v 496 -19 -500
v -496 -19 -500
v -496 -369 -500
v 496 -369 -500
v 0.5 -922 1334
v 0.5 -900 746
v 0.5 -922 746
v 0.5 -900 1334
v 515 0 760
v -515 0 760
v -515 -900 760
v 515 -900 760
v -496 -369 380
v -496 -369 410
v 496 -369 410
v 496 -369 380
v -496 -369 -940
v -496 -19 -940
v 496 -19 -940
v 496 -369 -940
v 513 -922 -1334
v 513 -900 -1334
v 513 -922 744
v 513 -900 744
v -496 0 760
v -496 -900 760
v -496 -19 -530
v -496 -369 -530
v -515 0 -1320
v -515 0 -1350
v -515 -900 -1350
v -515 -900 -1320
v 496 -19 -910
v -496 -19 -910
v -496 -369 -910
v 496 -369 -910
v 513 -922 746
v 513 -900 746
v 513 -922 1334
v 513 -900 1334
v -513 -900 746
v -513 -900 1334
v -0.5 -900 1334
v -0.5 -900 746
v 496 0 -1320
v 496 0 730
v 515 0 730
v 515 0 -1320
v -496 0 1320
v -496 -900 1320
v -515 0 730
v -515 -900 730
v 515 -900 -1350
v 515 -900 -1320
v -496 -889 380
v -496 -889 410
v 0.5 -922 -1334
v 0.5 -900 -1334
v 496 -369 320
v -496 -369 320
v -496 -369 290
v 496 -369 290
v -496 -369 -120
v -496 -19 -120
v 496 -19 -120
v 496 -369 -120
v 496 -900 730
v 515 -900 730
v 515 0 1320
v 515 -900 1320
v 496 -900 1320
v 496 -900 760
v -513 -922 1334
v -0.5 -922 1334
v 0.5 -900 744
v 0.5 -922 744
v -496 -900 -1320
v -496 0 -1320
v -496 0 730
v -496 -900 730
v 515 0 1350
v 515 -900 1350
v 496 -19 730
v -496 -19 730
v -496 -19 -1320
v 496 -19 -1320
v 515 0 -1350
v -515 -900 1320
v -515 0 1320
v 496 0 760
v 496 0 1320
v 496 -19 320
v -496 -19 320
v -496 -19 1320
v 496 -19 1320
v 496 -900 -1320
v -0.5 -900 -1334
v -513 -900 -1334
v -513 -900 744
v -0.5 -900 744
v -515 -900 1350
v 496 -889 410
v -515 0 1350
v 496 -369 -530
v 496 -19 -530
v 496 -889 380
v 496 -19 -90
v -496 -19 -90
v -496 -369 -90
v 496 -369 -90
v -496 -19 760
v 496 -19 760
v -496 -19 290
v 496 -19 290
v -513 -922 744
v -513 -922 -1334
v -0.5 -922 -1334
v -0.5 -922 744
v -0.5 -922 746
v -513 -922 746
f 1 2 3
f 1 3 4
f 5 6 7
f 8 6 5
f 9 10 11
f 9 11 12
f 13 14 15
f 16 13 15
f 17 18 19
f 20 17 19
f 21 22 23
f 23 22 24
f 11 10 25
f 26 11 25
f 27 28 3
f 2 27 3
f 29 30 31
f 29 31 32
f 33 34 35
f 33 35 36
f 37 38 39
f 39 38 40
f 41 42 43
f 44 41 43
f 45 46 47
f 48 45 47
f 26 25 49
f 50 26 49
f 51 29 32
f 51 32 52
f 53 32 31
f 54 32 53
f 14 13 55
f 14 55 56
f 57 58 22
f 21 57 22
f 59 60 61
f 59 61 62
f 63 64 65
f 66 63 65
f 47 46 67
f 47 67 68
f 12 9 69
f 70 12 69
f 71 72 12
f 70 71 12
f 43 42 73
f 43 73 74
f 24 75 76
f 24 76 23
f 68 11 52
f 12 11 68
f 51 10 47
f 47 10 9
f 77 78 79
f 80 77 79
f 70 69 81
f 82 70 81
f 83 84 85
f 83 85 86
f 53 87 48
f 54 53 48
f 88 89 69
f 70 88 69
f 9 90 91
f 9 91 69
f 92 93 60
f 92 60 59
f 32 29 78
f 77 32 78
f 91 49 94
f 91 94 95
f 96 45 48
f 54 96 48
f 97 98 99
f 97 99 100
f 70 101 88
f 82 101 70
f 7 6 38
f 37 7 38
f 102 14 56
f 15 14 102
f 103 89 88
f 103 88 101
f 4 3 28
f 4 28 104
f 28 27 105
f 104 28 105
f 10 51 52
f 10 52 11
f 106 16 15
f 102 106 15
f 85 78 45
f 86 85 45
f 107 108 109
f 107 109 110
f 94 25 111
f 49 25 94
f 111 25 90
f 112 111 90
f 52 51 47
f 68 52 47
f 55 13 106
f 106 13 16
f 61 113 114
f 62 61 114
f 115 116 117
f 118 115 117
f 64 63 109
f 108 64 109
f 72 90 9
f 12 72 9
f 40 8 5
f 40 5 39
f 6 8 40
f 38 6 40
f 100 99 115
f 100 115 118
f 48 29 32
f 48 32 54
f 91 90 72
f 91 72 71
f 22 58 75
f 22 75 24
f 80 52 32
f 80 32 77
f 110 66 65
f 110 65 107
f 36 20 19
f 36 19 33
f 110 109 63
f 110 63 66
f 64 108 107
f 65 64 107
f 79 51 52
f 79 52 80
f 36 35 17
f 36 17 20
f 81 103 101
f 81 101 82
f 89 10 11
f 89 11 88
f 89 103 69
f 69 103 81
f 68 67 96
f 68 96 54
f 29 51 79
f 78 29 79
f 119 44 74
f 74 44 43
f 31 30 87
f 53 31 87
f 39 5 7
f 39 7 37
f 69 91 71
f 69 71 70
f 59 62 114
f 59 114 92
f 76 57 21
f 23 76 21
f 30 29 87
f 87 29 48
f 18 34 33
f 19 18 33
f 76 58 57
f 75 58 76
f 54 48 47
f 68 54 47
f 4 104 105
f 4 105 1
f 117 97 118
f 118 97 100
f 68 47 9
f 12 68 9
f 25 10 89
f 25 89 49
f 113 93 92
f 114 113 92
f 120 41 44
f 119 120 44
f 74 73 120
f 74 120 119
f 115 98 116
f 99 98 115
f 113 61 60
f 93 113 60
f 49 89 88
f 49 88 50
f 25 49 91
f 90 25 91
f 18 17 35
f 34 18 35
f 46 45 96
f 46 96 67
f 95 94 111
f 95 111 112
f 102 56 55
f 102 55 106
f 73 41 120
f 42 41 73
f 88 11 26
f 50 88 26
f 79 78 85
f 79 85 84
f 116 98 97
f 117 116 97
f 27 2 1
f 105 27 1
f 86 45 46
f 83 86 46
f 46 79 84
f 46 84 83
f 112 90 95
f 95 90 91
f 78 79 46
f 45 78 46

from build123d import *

# Parameters (mm, degrees)
F1_W      = 1030
F1_H      = 30
F2_DEPTH  = 900
F3_W      = 19
F3_H      = 560
F3_H_2    = 2050
F4_DEPTH  = 900
F5_W      = 992
F5_H      = 560
F5_H_2    = 2050
F6_DEPTH  = 19
F7_W      = 992
F7_H      = 30
F8_DEPTH  = 350
F9_W      = 992
F9_H      = 30
F10_DEPTH = 520
F11_W     = 512.5
F11_H     = 2078
F11_H_2   = 588
F12_DEPTH = 22


with BuildPart() as f2:
    # F1 (on Front) → F2 (new body)
    with BuildSketch(Plane.XZ):
        with Locations((0, -1335)):
            Rectangle(F1_W, F1_H)
        with Locations((0, 745)):
            Rectangle(F1_W, F1_H)
        with Locations((0, 1335)):
            Rectangle(F1_W, F1_H)
    extrude(amount=F2_DEPTH)


with BuildPart() as f4:
    # F3 (on Front) → F4 (new body, through all)
    with BuildSketch(Plane.XZ):
        with Locations((-505.5, 1040)):
            Rectangle(F3_W, F3_H)
        with Locations((-505.5, -295)):
            Rectangle(F3_W, F3_H_2)
        with Locations((505.5, -295)):
            Rectangle(F3_W, F3_H_2)
        with Locations((505.5, 1040)):
            Rectangle(F3_W, F3_H)
    extrude(amount=F4_DEPTH)


with BuildPart() as f6:
    # F5 (on Front) → F6 (new body)
    with BuildSketch(Plane.XZ):
        with Locations((0, 1040)):
            Rectangle(F5_W, F5_H)
        with Locations((0, -295)):
            Rectangle(F5_W, F5_H_2)
    extrude(amount=F6_DEPTH)


with BuildPart() as f8:
    # F7 (on face) → F8 (new body)
    with BuildSketch(Plane.XZ.offset(19)):
        with Locations((0, -925)):
            Rectangle(F7_W, F7_H)
        with Locations((0, -515)):
            Rectangle(F7_W, F7_H)
        with Locations((0, -105)):
            Rectangle(F7_W, F7_H)
        with Locations((0, 305)):
            Rectangle(F7_W, F7_H)
    extrude(amount=F8_DEPTH)


with BuildPart() as f10:
    # F9 (on face) → F10 (new body)
    with BuildSketch(Plane.XZ.offset(369)):
        with Locations((0, 395)):
            Rectangle(F9_W, F9_H)
    extrude(amount=F10_DEPTH)


with BuildPart() as f12:
    # F11 (on face) → F12 (new body)
    with BuildSketch(Plane.XZ.offset(900)):
        with Locations((-256.75, -295)):
            Rectangle(F11_W, F11_H)
        with Locations((-256.75, 1040)):
            Rectangle(F11_W, F11_H_2)
        with Locations((256.75, -295)):
            Rectangle(F11_W, F11_H)
        with Locations((256.75, 1040)):
            Rectangle(F11_W, F11_H_2)
    extrude(amount=F12_DEPTH)


solid = Compound([f2.part, f4.part, f6.part, f8.part, f10.part, f12.part])
